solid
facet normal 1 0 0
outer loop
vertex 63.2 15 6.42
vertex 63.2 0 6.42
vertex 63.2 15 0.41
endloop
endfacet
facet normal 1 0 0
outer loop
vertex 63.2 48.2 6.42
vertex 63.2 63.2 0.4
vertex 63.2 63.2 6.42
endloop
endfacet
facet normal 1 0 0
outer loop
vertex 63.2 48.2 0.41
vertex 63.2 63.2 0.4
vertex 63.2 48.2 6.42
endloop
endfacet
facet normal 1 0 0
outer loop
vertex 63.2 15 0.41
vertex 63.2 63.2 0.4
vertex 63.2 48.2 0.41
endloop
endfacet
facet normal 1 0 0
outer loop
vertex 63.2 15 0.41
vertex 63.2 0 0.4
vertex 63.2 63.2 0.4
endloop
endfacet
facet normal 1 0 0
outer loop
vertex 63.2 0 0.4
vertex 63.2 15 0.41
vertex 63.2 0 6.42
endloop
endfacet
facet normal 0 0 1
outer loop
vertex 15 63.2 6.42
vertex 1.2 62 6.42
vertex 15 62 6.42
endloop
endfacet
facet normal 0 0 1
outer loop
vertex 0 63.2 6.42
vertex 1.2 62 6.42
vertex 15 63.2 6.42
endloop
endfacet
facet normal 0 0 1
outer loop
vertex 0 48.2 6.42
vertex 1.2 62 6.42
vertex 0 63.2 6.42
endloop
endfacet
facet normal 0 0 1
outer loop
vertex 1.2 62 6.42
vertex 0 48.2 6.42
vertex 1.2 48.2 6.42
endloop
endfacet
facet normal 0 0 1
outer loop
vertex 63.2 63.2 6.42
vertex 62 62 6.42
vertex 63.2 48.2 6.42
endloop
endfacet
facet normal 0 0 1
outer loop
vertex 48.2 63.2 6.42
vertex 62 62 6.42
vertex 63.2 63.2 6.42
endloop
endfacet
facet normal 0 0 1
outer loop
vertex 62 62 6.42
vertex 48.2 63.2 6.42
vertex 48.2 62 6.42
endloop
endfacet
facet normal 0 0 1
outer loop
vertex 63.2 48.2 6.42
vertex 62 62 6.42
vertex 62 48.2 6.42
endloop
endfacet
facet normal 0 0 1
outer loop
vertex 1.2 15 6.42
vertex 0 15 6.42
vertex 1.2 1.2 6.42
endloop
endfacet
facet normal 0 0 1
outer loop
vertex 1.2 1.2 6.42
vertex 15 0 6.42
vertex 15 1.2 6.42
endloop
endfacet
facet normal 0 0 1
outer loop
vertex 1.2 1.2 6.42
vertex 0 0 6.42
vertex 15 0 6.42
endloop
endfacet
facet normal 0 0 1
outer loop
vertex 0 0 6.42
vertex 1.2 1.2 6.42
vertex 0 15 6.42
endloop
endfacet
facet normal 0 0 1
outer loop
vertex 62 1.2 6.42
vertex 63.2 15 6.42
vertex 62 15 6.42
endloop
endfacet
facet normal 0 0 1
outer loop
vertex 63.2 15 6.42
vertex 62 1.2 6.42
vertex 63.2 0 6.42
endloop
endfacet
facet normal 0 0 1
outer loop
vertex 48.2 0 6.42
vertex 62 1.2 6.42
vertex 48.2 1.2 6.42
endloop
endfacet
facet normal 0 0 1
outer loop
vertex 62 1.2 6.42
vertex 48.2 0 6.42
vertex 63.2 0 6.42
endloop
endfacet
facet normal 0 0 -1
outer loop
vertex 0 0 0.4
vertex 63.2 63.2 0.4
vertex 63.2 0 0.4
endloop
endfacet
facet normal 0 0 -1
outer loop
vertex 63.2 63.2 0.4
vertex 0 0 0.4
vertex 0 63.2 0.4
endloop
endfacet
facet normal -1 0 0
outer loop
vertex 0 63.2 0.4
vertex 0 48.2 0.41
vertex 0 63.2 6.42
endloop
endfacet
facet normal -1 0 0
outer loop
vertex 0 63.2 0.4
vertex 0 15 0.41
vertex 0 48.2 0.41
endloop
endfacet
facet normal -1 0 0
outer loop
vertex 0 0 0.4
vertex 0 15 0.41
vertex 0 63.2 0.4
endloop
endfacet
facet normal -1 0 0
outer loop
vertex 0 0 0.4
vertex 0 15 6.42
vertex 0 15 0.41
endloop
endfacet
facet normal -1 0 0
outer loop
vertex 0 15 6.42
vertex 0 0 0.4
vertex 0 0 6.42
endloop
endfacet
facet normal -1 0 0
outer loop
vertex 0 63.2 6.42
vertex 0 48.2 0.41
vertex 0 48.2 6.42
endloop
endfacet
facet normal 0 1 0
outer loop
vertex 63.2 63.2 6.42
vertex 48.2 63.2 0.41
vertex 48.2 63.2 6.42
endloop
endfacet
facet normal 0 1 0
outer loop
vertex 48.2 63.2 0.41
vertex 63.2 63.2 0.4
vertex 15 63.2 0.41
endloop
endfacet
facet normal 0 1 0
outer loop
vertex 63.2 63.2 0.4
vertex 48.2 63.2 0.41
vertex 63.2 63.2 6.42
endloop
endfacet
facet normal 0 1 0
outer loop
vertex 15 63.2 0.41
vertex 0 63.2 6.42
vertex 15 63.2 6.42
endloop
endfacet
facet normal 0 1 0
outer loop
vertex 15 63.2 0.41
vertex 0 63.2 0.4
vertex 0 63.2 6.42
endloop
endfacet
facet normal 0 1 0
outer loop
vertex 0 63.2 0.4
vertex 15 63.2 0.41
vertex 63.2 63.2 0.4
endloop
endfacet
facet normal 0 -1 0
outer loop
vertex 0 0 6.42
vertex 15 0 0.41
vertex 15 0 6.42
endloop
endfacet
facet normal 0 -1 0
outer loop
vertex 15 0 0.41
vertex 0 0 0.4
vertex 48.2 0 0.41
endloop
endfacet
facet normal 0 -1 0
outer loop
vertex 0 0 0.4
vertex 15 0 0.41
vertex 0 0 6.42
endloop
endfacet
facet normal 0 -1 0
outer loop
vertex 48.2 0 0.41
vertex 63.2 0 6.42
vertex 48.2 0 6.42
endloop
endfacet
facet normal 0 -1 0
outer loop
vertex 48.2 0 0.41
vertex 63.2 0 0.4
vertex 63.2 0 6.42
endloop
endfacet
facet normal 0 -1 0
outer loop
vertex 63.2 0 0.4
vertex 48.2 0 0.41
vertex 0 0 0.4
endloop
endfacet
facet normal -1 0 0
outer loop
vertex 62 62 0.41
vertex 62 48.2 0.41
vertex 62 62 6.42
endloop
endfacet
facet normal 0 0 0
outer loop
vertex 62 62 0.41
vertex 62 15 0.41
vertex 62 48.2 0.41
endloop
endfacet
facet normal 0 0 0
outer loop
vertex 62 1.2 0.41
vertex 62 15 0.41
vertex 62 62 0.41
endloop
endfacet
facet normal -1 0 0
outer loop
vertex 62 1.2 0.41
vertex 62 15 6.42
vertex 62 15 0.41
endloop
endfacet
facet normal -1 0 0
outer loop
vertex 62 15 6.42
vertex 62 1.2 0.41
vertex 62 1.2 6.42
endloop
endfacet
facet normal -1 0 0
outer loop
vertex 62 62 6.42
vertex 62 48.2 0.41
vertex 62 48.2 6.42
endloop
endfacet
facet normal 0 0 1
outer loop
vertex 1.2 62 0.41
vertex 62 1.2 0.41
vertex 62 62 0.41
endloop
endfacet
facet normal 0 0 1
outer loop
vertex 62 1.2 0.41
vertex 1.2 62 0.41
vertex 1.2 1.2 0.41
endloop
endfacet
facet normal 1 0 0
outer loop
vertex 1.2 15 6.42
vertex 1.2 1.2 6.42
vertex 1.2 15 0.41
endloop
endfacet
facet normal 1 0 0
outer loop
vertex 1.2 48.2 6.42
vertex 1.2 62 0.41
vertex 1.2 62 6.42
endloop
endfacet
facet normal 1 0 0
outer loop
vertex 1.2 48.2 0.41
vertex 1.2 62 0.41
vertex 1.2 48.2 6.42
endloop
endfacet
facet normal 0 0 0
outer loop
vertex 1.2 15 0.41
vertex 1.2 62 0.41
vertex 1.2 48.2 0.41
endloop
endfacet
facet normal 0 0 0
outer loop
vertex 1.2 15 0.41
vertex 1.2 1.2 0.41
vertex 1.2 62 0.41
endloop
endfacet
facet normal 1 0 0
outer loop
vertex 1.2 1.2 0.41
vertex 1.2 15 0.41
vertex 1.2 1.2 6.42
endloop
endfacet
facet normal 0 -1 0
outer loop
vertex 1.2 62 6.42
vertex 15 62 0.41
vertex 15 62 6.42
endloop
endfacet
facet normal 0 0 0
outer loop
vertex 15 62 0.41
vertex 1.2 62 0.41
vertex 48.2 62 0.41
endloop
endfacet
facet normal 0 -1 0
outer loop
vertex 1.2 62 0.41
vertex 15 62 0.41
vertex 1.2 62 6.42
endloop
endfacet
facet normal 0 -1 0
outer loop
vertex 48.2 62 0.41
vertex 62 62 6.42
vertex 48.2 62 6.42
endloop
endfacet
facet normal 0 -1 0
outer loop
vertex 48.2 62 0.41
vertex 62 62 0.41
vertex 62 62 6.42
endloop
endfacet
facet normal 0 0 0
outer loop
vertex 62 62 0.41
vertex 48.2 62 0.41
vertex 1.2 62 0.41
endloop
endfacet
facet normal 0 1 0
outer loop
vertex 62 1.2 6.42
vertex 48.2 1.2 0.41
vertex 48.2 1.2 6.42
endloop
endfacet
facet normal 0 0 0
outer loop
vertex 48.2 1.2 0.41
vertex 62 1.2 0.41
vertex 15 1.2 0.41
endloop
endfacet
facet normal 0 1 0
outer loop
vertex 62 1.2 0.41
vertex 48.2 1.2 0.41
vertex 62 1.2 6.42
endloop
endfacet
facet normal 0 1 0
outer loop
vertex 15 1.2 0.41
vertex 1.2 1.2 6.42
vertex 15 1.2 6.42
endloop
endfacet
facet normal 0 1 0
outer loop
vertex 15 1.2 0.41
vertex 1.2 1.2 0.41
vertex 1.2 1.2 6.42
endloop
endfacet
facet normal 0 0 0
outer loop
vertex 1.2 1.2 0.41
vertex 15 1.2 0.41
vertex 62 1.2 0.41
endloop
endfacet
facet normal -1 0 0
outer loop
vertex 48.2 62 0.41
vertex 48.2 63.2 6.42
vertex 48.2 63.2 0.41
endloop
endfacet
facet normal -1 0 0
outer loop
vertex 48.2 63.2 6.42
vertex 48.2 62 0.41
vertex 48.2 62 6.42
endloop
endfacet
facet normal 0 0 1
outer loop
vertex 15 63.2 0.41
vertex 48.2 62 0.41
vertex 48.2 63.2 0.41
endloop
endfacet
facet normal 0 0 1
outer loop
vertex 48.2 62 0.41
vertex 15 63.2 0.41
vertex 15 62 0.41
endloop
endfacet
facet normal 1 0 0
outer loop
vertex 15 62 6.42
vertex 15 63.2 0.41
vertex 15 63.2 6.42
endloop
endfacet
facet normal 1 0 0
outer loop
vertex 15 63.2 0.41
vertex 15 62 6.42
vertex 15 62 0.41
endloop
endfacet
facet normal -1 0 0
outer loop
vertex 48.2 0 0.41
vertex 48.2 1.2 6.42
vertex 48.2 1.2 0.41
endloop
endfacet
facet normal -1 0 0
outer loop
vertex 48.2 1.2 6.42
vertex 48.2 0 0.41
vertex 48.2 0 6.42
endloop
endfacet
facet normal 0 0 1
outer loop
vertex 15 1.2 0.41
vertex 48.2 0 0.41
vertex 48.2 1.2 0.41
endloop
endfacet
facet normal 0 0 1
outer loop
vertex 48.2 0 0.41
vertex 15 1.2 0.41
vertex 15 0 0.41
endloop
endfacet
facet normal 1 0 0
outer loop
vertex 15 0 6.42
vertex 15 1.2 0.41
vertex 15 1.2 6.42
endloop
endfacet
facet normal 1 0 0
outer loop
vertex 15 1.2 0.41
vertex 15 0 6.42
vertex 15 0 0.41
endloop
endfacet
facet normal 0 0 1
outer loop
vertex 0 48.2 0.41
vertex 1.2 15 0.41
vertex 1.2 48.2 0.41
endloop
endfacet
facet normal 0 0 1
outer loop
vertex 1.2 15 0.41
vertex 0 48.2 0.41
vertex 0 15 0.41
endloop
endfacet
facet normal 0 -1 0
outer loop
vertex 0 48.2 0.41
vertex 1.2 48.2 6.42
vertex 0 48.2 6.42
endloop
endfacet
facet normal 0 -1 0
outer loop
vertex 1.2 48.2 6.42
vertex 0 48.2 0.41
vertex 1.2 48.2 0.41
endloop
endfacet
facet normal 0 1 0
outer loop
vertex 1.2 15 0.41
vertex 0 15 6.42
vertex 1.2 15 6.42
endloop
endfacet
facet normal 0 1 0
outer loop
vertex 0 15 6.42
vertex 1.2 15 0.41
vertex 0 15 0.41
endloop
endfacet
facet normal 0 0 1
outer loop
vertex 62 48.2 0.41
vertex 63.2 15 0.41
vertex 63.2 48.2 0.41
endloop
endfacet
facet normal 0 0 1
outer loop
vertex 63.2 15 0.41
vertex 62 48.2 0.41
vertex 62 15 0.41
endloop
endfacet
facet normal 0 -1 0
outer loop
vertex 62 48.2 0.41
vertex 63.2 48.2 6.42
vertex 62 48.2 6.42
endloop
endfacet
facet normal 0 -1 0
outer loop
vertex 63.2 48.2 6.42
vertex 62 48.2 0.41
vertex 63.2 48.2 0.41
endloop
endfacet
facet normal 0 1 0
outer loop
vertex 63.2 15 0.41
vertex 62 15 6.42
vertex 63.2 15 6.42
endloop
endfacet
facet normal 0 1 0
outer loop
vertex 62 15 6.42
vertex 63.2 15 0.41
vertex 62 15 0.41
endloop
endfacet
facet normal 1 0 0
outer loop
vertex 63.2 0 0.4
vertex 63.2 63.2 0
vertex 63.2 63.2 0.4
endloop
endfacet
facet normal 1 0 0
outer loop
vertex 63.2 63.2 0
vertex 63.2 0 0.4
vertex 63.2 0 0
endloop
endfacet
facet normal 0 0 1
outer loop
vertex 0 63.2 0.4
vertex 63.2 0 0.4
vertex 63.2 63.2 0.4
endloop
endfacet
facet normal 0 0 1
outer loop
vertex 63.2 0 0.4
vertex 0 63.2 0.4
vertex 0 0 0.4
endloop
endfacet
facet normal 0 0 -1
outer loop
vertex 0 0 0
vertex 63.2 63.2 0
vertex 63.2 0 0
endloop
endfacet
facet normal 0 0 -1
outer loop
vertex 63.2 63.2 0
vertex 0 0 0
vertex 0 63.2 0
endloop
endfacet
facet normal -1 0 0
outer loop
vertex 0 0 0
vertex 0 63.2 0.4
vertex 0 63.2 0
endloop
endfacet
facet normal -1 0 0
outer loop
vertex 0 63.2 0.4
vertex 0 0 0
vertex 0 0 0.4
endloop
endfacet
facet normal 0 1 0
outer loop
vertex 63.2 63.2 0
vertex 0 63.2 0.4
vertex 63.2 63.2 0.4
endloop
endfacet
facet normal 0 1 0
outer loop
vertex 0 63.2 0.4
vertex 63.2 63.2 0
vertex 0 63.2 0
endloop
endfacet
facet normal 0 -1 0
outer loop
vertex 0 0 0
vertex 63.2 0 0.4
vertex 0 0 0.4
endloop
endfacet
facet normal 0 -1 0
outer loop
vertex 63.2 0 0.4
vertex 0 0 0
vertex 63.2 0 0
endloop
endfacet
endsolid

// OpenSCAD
// file: ../../Base/Rotation.scad
// Fischertechnik Box Foundation
// Geometry Helpers Rotation

include <PlacementOptions.scad>

// getRotatedSpace(space, rotation=NoRotation)
// Rotates the space dependent on the specified rotation

function getRotatedSpace(space, rotation=NoRotation) = [
    (rotation == Rotate90 || rotation == Rotate270) ? space.y : space.x,
    (rotation == Rotate90 || rotation == Rotate270) ? space.x : space.y
];

// Rotates the given space around the fixed left lower corner
// space = the space the children needs as width/depth list [width,depth]
// rotation = 0 Rotate0 degrees, 1 Rotate90 degrees, 2 Rotate180 degrees, 3 Rotate270 degrees (equivalent to -90)

module RotateFix(space, rotation=NoRotation) {
    dy = (rotation == Rotate0 || rotation == Rotate270) ? 0 :
        (rotation == Rotate90) ? space.x :
        space.y;
    dx = (rotation < Rotate180) ? 0 :
        (rotation == Rotate180) ? space.x :
        space.y;
    
    translate([dx, dy, 0])
        rotate([0, 0, rotations[rotation]])
            children();
}
// file: ../../Base/Alignment.scad
// Fischertechnik Box Foundation
// Geometry Helpers Alignment

include <PlacementOptions.scad>

// getAlignedX(elementWidth, spaceWidth, align=AlignRight, offset=0)
// Gets the aligned X offset of an element with the given
// width in the given space.
// elementWidth = The width of the element to positon
// spaceWidth = The space where the element should be aligned
// align = 0 AlignLeft, 1 AlignCenter, 2 AlignRight
// offset = an optional offset from the aligned position. When
// aligned left or centered, then positive values are in X direction.
// When aligned right then positive values are in negative X direction.

function getAlignedX(elementWidth, spaceWidth, align=AlignRight, offset=0) =
    (align == AlignLeft) ?
        offset :
        ((align == AlignCenter) ?
        (spaceWidth - elementWidth)/2 + offset :
        spaceWidth - offset - elementWidth);

// getAlignedY(elementDepth, spaceDepth, align=AlignTop, offset=0)
// Gets the aligned Y offset of an element with the given
// depth in the given space.
// elementDepth = The depth of the element to positon
// spaceDepth = The space where the element should be aligned
// align = 0 AlignBottom, 1 AlignCenter, 2 AlignTop
// offset = an optional offset from the aligned position. When
// aligned bottom or centered, then positive values are in Y direction.
// When aligned top then positive values are in negative Y direction.

function getAlignedY(elementDepth, spaceDepth, align=AlignTop, offset=0) =
    (align == AlignBottom) ?
        offset :
        ((align == AlignCenter) ?
        (spaceDepth - elementDepth)/2 + offset :
        spaceDepth - offset - elementDepth);
// file: ../../Base/Boxes.scad
// Fischertechnik Box Foundation
// Pre-designed Boxes

use <Constants.scad>

include <PlacementOptions.scad>

box190Width = 190;
box190Depth = 130;
box130Width = 130;
box130Depth = 95;

// Values are from an original ec3 box
topBottomDifference = 1.5;
outerHeight = 40;
innerHeight = 38.2;
baseThickness = outerHeight - innerHeight;
stackExcess = 5.7;
radius = 3.5;
wallThickness = 1.5;
tolerance = 0.2;
stackOffset = innerHeight - stackExcess;

boxUsageHeight = stackOffset;
boxWallThickness = wallThickness;
boxBaseThickness = baseThickness;
boxWebWidth = 3.0;

// getBoxWallThickness()
// Gets the wall thickness of a Fischertechnik Box
function getBoxWallThickness() = boxWallThickness;

// getBoxUsageHeight()
// Gets the usable height of a Fischertechnik box
function getBoxUsageHeight() = boxUsageHeight;

// getBoxInnerHeight()
// Gets the inner height of a Fischertechnik box, including the stack excess
function getBoxInnerHeight() = innerHeight;

// getBoxBaseThickness()
// Gets the thickness of the Fischertechnik box base.
function getBoxBaseThickness() = boxBaseThickness;

// getBoxWebWidth()
// Gets the width of a box web
function getBoxWebWidth() = boxWebWidth;

// getBox190Space()
// Gets the usable inner space of a Box 190 as an x/y-list
function getBox190Space() = [
    box190Width - 2*getBoxWallThickness() - topBottomDifference, 
    box190Depth - 2*getBoxWallThickness() - topBottomDifference ];

// BoxBase(width, depth)
// Creates an empty stackable Fischertechnik compatible box
// width = Outer width of the box (190, 130, ...)
// depth = Outer depth of the box (130, 95, ...)

module BoxBase(width, depth, height=outerHeight) {    
    thinPlate = 0.01;

    innerHeight = height - baseThickness;    
    
    module BodyPlate(width, depth) {
        translate([radius, radius])
        hull() {
            w = width-2*radius;
            d = depth-2*radius;
            cube([w, d, thinPlate]);
            cylinder(thinPlate, r=radius, $fn=getFragments());
            translate([w, 0])
                cylinder(thinPlate, r=radius, $fn=getFragments());
            translate([w, d])
                cylinder(thinPlate, r=radius, $fn=getFragments());
            translate([0, d])
                cylinder(thinPlate, r=radius, $fn=getFragments());
        }
    }
    
    module Body(tolerance=tolerance) {
        hull() {
            // Bottom with tolerance to fit into the original boxes when stacked
            translate([-wallThickness+tolerance, -wallThickness+tolerance, -baseThickness])
                BodyPlate(width-topBottomDifference-2*tolerance, depth-topBottomDifference-2*tolerance);
            
            // Top
            translate([-wallThickness-topBottomDifference/2, -wallThickness-topBottomDifference/2, innerHeight-thinPlate])
                BodyPlate(width, depth);
         }
    }

    module Cutoff() {
        hull() {
            coWidth = width - 2*wallThickness;
            coDepth = depth - 2*wallThickness;
            
            // Bottom
            BodyPlate(coWidth-topBottomDifference, coDepth-topBottomDifference);

            // Top
            translate([-topBottomDifference/2, -topBottomDifference/2, innerHeight+thinPlate]) 
                BodyPlate(coWidth, coDepth);
        }
    }
    
    difference() {        
        Body();
        Cutoff();
        stackOffset = innerHeight - stackExcess;
        translate([0, 0, stackOffset + baseThickness])
            Body(tolerance=0);
    }
}

// Creates the Fischertechnik empty box 130x190 mm and places it at position 0,0
// 190x130 are the outer sizes, the inner space is slightly smaller. Use getBox190Space() to get the inner sizes.
// The box is positioned that the usable inner space is at the 0,0,0 position. The

module Box190() {
    BoxBase(box190Width, box190Depth);
}

// Gets the usable inner space of a Box 130 as an x/y-list
function getBox130Space() = [
    box130Width - 2*getBoxWallThickness() - topBottomDifference, 
    box130Depth - 2*getBoxWallThickness() - topBottomDifference ];

// Creates the Fischertechnik empty box 95x130 mm and places it at position 0,0
// 190x130 are the outer sizes, the inner space is slightly smaller. Use getBox190Space() to get the inner sizes.
// The box is positioned that the usable inner space is at the 0,0,0 position. The

module Box130() {
    BoxBase(box130Width, box130Depth);
}

// Creates a web at the specified box walls
// corner 0 = LowerLeft, 1 = UpperLeft, 2 = UpperRight, 3 = LowerRight
// side 0 = LeftOfCorner, 1 = RightOfCorner
// distance = Distance in mm from the corner
// boxSpace = inner width and depth of the box (default: Box 190)
// webWidth = length of the web (default is 3 mms)
// webThickness = thickness of the web (default is 1 mm)

module BoxWeb(corner, side, distance, boxSpace=getBox190Space(), webWidth=getBoxWebWidth(), webThickness=1.0) {
    sink = getBoxWallThickness()/2;

    width = (corner % 2 == 0) ? 
            (side == LeftOfCorner ? webWidth : webThickness) :
            (side == LeftOfCorner ? webThickness : webWidth);

    depth = (corner % 2 == 0) ? 
            (side == RightOfCorner ? webWidth : webThickness) :
            (side == RightOfCorner ? webThickness : webWidth);
    
    xDiff = corner == LowerLeft ? 
                (side == LeftOfCorner ? -sink : distance) :
            (corner == UpperLeft ?                
                (side == LeftOfCorner ? distance : -sink) :
            (corner == UpperRight ?
                (side == LeftOfCorner ? boxSpace.x-webWidth+sink : boxSpace.x-distance-webThickness) :
                (side == LeftOfCorner ? boxSpace.x-distance-webThickness: boxSpace.x-webWidth+sink)));

    yDiff = corner == LowerLeft ? 
                (side == RightOfCorner ? -sink : distance) :
            (corner == UpperLeft ?
                (side == RightOfCorner ? boxSpace.y-distance : boxSpace.y-webWidth+sink) :
            (corner == UpperRight ?
                (side == RightOfCorner ? boxSpace.y-webWidth+sink : boxSpace.y-distance) :
                (side == RightOfCorner ? distance : -sink)));
    
    translate([xDiff, yDiff, -getExcess()])
        cube([width, depth, boxUsageHeight + 2*getExcess()]);
}
// file: ../../Base/Placement.scad
// Fischertechnik Box Foundation
// Geometry Helpers Placement

use <Constants.scad>
use <Alignment.scad>
use <Rotation.scad>
use <Boxes.scad>

include <PlacementOptions.scad>

// Place(x=0, y=0, elementSpace=[0,0], alignX=AlignLeft, alignY=AlignBottom, rotation=Rotate0, boxSpace=getBox190Space())
// Places the child at the specified position
// y = Y-Position. This is a relative position when an X aligment is specified.
// x = X-Position. This is a relative position when an Y aligment is specified.
// elementSpace = space of the element to be placed [x,y]
// alignX = -1=NoAlign, 0 AlignLeft, 1 AlignCenter, 3 AlignRight (elementSpace and boxSpace required!)
// alignY = -1=NoAlign, 2 AlignBottom, 1 AlignCenter, 4 AlignTop (elementSpace and boxSpace required!)
// rotation = 0 Rotate0 0 degrees, 1 Rotate90 90 degrees, 
// 2 Rotate180 180 degrees, 3 Rotate270 270 degrees (equivalent to -90)
// boxSpace = Inner space of the box where the placement occurs [x,y] - default is Box 190x130 inner space

module Place(x=0, y=0, elementSpace=[0,0], 
  alignX=AlignLeft, alignY=AlignBottom, 
  rotation=NoRotation, boxSpace=getBox190Space()) {

    module Position(x, y, space, rotation=Rotate0) {
        translate([x, y, 0])
            RotateFix(space, rotation)
                children();
    }

    space = getRotatedSpace(elementSpace, rotation);
    alignedX = getAlignedX(space.x, boxSpace.x, alignX, x);
    alignedY = getAlignedY(space.y, boxSpace.y, alignY, y);
    Position(alignedX, alignedY, elementSpace, rotation)
        children();
}

// Center(space=getBox130Space(), elementSpace=[0,0])
// space = Space where the children is centered. For cylinder use centered=true and no elementSpace.
// elementSpace = space of the element to be centered [x,y]

module Center(space=getBox190Space(), elementSpace=[0,0]) {
    Place(elementSpace=elementSpace, boxSpace=space, alignX=AlignCenter, alignY=AlignCenter)
        children();
}

// CenterHorizontal(width=0, y=0, offset=0, space=getBox130Space())
// width = Width of the element to be placed.
// y = Y position of the element
// offset = Offset from the center position (negative will be left of the center)
// space = Space where the element is placed

module CenterHorizontal(width=0, y=0, offset=0, space=getBox190Space()) {
    Place(x=offset, y=y, elementSpace=[width, 0], boxSpace=space, alignX=AlignCenter)
        children(0);
}

// CenterVertical(depth=0, x=0, offset=0, space=getBox130Space())
// depth = Depth of the element to be placed.
// x = X position of the element
// offset = Offset from the center position (negative will be down of the center)
// space = Space where the element is placed

module CenterVertical(depth=0, x=0, offset=0, space=getBox190Space()) {
    Place(x=x, y=offset, elementSpace=[0, depth], boxSpace=space, alignY=AlignCenter)
        children(0);
}

// getIsVertical(align)
// True if the specified alignment needs a vertical orientation for a divider (AlignRight, AlignLeft)

function getIsVertical(align) = (align == AlignRight || align == AlignLeft);

// getIsHorizontal(align)
// True if the specified alignment needs a horizontal orientation for a divider (AlignTop, AlignBottom)

function getIsHorizontal(align) = (align == AlignTop || align == AlignBottom);
// file: ../../Base/PlacementOptions.scad
// Fischertechnik Box Foundation
// Placement Options

// Alignment
NoAlign = 0;
AlignLeft = 1;
AlignBottom = 2;
AlignCenter = 3;
AlignRight = 4;
AlignTop = 5;

// Element rotation degree steps
rotations = [0, -90, -180, -270];

// Rotation
NoRotation = 0;
Rotate0 = 0;
Rotate90 = 1;
Rotate180 = 2;
Rotate270 = 3;

// Docking (seen from above)
NoDock = -1;
DockLeft = 0;
DockTop = 1;
DockRight = 2;
DockCorner = 2;
DockBottom = 3;

// Web corners
LowerLeft = 0;
UpperLeft = 1;
UpperRight = 2;
LowerRight = 3;

// Web position relative to corner
LeftOfCorner = 0;
RightOfCorner = 1;
// file: ../../Elements/AxisClip10.scad
// Fischertechnik Box Library
// Axis for clip 10
// 31023

use <../ModelBase/Simple.scad>
use <../Base/Constants.scad>

width = 12;
depth = 12;
height = 23;
upperDiameter = 3.6;
clipHeight = 10;

// getAxisClip10Space()
// Gets the space of a frame for a clip 10 with spring ring (mot2)

function getAxisClip10Space() = [width, depth, height];

// AxisClip10(height, clipHeight)
// Axis for clip 10 with spring ring (mot2)
// height = Height of the complete axis
// clipHeight = Height of the rt for the clip (standard is 10, in mot3 its only 7)

module AxisClip10(height=height, clipHeight=clipHeight) {
    LeveledAxisWithSpace(height, height-clipHeight, getAxisClip10Space(), diameter=upperDiameter);
}

// Tests
color("lightgray")
AxisClip10();
// file: ../../Base/Constants.scad
// Fischertechnik Box Foundation
// Constants

// Constant values necessary for multiple elements

// Base constants
dividerThickness = 1.2;
excess = 0.01;
fragments = 90;
tolerance = 0.8;

// Gets the thickness of a divider 
function getDividerThickness() = dividerThickness;

// Gets the excess that is used to merge walls into each other
function getExcess() = excess;

// Gets amount of fragments of a cylinder
function getFragments() = fragments;

// Gets the inner tolerance of a frame to each side
function getTolerance() = tolerance;


// Fischertechnik specific constants
axisDiameter = 4;
axisBottomDiameter = axisDiameter + 1;
standardEdgeDistance = 2.5;
standardWebDistance = 11.5;
standardCornerLength = 15;
tubeWallFactor = 0.8;
smallPartsFrameHeight = 20;

// Gets axis diameter
function getAxisDiameter() = axisDiameter;

// Gets axis bottom diameter for thicker part at the bottom
function getAxisBottomDiameter() = axisBottomDiameter;

// gets the standard distance to the wall of the box for dockable frames with webs
function getStandardEdgeDistance() = standardEdgeDistance;

// gets the standard distance of each web to the corner of the dockable frame
function getStandardWebDistance() = standardWebDistance;

// gets the standard length of the corner walls of a dockable frame
function getStandardCornerLength() = standardCornerLength;

// gets the wall thickness of a tube.
function getTubeWallThickness() = tubeWallFactor * getDividerThickness();

// gets the frame height for docked small parts boxes.
function getSmallPartsFrameHeight() = smallPartsFrameHeight;
// file: ../../Elements/FrameBTSmartController.scad
// Fischertechnik Box Library
// Frame for BT Smart Controller
// 161944

use <../Base/Constants.scad>
use <../ModelBase/Simple.scad>
use <../ModelBase/Complex.scad>

include <../Base/PlacementOptions.scad>

width = 60;
depth = 60;
height = 6;

// getFrameBTSmartControllerSpace(alignX, alignY)
// alignX 0=NoAlign 1=AlignLeft 3=AlignCenter 4=AlignRight 
// alignY 0=AlignNo 2=AlignBottom 3=AlignCenter 5=AlignTop
// Gets the space the frame for BT Smart Controller needs as width and depth(.x and .y as a list). 

function getFrameBTSmartControllerSpace(alignX=NoAlign, alignY=NoAlign) = 
    getDockableEdgedFrameSpace([width, depth, height], alignX, alignY);

// FrameBTSmartController(alignX, alignY)
// Frame for TBT Smart Controller.
// alignX 0=NoAlign 1=AlignLeft 3=AlignCenter 4=AlignRight 
// alignY 0=AlignNo 2=AlignBottom 3=AlignCenter 5=AlignTop

module FrameBTSmartController(alignX=NoAlign, alignY=NoAlign) {
    DockableEdgedFrame([width, depth, height], alignX, alignY);
}

// Test
color("lightgray") {
    FrameBTSmartController();
}
// file: ../TestPrint.scad
// 3D Print Test Base

use <../Base/Constants.scad>

use <../Elements/AxisClip10.scad>

module TestPrint(elementSpace) {
    cube([elementSpace.x, elementSpace.y, 0.4]);
    translate([0,0,0.4+getExcess()]) {
        children();
    }
}

TestPrint(getAxisClip10Space())
    AxisClip10();
// main file
// 3D Print Test
// FrameBTSmartController

use <../TestPrint.scad>
use <../../Elements/FrameBTSmartController.scad>

TestPrint(getFrameBTSmartControllerSpace())
    FrameBTSmartController();
